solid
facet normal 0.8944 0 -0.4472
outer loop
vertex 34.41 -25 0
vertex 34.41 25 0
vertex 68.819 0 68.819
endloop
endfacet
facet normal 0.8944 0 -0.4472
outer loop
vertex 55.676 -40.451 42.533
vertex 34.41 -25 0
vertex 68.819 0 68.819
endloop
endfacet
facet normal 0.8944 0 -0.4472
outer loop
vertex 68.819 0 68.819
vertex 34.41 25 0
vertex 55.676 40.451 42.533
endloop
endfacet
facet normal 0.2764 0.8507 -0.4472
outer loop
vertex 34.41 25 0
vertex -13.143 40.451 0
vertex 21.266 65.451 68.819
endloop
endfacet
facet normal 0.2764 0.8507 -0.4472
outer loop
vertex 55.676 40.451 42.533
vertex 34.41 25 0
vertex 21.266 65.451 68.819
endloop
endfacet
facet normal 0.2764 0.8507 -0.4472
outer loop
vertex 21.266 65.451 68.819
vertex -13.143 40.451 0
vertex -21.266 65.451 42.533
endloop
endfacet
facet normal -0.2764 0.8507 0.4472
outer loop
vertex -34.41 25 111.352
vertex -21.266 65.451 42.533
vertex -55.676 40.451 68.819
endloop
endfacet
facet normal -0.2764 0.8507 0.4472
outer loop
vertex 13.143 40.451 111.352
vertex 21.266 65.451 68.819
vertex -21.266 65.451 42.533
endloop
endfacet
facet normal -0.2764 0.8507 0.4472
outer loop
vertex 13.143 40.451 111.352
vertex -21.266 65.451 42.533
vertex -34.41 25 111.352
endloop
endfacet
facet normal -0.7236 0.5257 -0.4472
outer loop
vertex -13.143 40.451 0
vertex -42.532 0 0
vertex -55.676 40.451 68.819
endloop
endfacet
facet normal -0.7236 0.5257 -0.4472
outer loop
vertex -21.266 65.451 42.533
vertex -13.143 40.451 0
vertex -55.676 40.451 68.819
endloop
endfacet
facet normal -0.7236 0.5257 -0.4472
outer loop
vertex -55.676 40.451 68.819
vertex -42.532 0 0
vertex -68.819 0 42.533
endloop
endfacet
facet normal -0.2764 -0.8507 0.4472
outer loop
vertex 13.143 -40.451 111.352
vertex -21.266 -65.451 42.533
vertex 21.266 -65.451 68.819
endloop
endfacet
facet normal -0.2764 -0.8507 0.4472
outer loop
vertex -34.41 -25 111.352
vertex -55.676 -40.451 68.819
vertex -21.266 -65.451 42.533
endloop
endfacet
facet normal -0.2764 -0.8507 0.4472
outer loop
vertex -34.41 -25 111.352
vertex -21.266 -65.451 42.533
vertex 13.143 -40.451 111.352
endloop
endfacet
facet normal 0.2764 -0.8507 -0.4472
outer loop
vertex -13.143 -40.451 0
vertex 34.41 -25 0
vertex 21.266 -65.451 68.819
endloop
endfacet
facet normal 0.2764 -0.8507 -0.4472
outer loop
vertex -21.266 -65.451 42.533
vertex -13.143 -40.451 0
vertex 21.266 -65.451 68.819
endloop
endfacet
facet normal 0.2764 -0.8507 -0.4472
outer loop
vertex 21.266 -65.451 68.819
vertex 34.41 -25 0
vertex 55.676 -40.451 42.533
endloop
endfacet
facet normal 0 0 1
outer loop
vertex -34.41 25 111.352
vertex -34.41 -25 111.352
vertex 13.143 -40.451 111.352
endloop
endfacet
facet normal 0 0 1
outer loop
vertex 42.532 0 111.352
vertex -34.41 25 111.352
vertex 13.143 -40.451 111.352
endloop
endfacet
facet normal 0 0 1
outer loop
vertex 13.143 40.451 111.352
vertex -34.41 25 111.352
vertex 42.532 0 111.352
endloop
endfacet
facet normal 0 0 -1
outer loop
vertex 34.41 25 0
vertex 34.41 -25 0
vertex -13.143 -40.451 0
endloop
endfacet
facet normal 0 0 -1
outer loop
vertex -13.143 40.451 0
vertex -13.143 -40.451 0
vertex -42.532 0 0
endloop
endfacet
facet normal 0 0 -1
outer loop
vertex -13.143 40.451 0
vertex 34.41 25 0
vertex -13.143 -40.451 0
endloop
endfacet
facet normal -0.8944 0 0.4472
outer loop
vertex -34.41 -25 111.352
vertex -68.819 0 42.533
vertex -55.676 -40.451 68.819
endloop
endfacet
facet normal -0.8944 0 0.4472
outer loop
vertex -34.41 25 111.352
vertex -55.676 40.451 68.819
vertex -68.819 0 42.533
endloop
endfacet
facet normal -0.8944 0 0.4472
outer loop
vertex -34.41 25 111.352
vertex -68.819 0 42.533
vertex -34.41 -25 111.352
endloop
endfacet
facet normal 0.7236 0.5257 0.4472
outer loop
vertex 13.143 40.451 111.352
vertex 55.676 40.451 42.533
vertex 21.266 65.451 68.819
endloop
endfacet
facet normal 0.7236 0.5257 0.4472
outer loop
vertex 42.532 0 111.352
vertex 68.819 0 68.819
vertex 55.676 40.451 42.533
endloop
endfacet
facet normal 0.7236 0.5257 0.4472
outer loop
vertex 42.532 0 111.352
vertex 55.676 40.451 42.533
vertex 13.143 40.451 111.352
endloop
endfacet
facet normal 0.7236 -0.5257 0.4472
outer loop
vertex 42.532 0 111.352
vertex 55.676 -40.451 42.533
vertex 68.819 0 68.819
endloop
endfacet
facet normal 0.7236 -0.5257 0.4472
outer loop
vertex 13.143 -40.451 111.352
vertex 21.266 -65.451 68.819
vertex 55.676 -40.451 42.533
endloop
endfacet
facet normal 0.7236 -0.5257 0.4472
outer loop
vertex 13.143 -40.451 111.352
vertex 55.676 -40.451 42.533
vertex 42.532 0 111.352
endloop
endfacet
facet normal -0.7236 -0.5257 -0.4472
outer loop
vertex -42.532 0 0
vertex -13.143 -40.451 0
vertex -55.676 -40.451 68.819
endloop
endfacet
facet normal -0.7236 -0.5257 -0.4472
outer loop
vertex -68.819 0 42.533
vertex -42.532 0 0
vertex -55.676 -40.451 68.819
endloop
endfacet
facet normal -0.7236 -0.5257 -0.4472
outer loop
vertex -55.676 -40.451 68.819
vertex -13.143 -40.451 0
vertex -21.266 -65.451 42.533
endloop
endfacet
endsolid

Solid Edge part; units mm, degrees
sketch "Sketch1" plane through (0, 0, 0) normal (0, -1, 0) x (1, 0, 0)
  arc A0 (0, 208.4456) -> (0, -97.0939) centre (0, 55.6758) ccw
  line L0 (0, 208.4456) -> (0, -97.0939)
revolve "RevolvedProtrusion1" add sketch "Sketch1" angle 360 about axis through (0, 0, 208.4456) along (0, 0, -1)
sketch "Sketch2" plane through (0, 0, 0) normal (0, -1, 0) x (1, 0, 0)
  line L0 (-68.8191, 42.5325) -> (-34.4095, 111.3516)
  line L1 (-34.4095, 111.3516) -> (42.5325, 111.3516)
extrude "Cutout1" cut sketch "Sketch2" along normal through all and the other way through all material side at (-51.659, 0, 76.9644)
sketch "Sketch3" plane through (0, 0, 0) normal (0, -1, 0) x (1, 0, 0)
  line L0 (68.8191, 68.8191) -> (34.4095, 0)
  line L1 (-42.5325, 0) -> (34.4095, 0)
extrude "Cutout2" cut sketch "Sketch3" along normal through all and the other way through all material side at (51.659, 0, 34.3872)
pattern_circular "Pattern1" count 5 over 360 about axis through (0, 0, 0) along (0, 0, 1) of "Cutout1", "Cutout2"
